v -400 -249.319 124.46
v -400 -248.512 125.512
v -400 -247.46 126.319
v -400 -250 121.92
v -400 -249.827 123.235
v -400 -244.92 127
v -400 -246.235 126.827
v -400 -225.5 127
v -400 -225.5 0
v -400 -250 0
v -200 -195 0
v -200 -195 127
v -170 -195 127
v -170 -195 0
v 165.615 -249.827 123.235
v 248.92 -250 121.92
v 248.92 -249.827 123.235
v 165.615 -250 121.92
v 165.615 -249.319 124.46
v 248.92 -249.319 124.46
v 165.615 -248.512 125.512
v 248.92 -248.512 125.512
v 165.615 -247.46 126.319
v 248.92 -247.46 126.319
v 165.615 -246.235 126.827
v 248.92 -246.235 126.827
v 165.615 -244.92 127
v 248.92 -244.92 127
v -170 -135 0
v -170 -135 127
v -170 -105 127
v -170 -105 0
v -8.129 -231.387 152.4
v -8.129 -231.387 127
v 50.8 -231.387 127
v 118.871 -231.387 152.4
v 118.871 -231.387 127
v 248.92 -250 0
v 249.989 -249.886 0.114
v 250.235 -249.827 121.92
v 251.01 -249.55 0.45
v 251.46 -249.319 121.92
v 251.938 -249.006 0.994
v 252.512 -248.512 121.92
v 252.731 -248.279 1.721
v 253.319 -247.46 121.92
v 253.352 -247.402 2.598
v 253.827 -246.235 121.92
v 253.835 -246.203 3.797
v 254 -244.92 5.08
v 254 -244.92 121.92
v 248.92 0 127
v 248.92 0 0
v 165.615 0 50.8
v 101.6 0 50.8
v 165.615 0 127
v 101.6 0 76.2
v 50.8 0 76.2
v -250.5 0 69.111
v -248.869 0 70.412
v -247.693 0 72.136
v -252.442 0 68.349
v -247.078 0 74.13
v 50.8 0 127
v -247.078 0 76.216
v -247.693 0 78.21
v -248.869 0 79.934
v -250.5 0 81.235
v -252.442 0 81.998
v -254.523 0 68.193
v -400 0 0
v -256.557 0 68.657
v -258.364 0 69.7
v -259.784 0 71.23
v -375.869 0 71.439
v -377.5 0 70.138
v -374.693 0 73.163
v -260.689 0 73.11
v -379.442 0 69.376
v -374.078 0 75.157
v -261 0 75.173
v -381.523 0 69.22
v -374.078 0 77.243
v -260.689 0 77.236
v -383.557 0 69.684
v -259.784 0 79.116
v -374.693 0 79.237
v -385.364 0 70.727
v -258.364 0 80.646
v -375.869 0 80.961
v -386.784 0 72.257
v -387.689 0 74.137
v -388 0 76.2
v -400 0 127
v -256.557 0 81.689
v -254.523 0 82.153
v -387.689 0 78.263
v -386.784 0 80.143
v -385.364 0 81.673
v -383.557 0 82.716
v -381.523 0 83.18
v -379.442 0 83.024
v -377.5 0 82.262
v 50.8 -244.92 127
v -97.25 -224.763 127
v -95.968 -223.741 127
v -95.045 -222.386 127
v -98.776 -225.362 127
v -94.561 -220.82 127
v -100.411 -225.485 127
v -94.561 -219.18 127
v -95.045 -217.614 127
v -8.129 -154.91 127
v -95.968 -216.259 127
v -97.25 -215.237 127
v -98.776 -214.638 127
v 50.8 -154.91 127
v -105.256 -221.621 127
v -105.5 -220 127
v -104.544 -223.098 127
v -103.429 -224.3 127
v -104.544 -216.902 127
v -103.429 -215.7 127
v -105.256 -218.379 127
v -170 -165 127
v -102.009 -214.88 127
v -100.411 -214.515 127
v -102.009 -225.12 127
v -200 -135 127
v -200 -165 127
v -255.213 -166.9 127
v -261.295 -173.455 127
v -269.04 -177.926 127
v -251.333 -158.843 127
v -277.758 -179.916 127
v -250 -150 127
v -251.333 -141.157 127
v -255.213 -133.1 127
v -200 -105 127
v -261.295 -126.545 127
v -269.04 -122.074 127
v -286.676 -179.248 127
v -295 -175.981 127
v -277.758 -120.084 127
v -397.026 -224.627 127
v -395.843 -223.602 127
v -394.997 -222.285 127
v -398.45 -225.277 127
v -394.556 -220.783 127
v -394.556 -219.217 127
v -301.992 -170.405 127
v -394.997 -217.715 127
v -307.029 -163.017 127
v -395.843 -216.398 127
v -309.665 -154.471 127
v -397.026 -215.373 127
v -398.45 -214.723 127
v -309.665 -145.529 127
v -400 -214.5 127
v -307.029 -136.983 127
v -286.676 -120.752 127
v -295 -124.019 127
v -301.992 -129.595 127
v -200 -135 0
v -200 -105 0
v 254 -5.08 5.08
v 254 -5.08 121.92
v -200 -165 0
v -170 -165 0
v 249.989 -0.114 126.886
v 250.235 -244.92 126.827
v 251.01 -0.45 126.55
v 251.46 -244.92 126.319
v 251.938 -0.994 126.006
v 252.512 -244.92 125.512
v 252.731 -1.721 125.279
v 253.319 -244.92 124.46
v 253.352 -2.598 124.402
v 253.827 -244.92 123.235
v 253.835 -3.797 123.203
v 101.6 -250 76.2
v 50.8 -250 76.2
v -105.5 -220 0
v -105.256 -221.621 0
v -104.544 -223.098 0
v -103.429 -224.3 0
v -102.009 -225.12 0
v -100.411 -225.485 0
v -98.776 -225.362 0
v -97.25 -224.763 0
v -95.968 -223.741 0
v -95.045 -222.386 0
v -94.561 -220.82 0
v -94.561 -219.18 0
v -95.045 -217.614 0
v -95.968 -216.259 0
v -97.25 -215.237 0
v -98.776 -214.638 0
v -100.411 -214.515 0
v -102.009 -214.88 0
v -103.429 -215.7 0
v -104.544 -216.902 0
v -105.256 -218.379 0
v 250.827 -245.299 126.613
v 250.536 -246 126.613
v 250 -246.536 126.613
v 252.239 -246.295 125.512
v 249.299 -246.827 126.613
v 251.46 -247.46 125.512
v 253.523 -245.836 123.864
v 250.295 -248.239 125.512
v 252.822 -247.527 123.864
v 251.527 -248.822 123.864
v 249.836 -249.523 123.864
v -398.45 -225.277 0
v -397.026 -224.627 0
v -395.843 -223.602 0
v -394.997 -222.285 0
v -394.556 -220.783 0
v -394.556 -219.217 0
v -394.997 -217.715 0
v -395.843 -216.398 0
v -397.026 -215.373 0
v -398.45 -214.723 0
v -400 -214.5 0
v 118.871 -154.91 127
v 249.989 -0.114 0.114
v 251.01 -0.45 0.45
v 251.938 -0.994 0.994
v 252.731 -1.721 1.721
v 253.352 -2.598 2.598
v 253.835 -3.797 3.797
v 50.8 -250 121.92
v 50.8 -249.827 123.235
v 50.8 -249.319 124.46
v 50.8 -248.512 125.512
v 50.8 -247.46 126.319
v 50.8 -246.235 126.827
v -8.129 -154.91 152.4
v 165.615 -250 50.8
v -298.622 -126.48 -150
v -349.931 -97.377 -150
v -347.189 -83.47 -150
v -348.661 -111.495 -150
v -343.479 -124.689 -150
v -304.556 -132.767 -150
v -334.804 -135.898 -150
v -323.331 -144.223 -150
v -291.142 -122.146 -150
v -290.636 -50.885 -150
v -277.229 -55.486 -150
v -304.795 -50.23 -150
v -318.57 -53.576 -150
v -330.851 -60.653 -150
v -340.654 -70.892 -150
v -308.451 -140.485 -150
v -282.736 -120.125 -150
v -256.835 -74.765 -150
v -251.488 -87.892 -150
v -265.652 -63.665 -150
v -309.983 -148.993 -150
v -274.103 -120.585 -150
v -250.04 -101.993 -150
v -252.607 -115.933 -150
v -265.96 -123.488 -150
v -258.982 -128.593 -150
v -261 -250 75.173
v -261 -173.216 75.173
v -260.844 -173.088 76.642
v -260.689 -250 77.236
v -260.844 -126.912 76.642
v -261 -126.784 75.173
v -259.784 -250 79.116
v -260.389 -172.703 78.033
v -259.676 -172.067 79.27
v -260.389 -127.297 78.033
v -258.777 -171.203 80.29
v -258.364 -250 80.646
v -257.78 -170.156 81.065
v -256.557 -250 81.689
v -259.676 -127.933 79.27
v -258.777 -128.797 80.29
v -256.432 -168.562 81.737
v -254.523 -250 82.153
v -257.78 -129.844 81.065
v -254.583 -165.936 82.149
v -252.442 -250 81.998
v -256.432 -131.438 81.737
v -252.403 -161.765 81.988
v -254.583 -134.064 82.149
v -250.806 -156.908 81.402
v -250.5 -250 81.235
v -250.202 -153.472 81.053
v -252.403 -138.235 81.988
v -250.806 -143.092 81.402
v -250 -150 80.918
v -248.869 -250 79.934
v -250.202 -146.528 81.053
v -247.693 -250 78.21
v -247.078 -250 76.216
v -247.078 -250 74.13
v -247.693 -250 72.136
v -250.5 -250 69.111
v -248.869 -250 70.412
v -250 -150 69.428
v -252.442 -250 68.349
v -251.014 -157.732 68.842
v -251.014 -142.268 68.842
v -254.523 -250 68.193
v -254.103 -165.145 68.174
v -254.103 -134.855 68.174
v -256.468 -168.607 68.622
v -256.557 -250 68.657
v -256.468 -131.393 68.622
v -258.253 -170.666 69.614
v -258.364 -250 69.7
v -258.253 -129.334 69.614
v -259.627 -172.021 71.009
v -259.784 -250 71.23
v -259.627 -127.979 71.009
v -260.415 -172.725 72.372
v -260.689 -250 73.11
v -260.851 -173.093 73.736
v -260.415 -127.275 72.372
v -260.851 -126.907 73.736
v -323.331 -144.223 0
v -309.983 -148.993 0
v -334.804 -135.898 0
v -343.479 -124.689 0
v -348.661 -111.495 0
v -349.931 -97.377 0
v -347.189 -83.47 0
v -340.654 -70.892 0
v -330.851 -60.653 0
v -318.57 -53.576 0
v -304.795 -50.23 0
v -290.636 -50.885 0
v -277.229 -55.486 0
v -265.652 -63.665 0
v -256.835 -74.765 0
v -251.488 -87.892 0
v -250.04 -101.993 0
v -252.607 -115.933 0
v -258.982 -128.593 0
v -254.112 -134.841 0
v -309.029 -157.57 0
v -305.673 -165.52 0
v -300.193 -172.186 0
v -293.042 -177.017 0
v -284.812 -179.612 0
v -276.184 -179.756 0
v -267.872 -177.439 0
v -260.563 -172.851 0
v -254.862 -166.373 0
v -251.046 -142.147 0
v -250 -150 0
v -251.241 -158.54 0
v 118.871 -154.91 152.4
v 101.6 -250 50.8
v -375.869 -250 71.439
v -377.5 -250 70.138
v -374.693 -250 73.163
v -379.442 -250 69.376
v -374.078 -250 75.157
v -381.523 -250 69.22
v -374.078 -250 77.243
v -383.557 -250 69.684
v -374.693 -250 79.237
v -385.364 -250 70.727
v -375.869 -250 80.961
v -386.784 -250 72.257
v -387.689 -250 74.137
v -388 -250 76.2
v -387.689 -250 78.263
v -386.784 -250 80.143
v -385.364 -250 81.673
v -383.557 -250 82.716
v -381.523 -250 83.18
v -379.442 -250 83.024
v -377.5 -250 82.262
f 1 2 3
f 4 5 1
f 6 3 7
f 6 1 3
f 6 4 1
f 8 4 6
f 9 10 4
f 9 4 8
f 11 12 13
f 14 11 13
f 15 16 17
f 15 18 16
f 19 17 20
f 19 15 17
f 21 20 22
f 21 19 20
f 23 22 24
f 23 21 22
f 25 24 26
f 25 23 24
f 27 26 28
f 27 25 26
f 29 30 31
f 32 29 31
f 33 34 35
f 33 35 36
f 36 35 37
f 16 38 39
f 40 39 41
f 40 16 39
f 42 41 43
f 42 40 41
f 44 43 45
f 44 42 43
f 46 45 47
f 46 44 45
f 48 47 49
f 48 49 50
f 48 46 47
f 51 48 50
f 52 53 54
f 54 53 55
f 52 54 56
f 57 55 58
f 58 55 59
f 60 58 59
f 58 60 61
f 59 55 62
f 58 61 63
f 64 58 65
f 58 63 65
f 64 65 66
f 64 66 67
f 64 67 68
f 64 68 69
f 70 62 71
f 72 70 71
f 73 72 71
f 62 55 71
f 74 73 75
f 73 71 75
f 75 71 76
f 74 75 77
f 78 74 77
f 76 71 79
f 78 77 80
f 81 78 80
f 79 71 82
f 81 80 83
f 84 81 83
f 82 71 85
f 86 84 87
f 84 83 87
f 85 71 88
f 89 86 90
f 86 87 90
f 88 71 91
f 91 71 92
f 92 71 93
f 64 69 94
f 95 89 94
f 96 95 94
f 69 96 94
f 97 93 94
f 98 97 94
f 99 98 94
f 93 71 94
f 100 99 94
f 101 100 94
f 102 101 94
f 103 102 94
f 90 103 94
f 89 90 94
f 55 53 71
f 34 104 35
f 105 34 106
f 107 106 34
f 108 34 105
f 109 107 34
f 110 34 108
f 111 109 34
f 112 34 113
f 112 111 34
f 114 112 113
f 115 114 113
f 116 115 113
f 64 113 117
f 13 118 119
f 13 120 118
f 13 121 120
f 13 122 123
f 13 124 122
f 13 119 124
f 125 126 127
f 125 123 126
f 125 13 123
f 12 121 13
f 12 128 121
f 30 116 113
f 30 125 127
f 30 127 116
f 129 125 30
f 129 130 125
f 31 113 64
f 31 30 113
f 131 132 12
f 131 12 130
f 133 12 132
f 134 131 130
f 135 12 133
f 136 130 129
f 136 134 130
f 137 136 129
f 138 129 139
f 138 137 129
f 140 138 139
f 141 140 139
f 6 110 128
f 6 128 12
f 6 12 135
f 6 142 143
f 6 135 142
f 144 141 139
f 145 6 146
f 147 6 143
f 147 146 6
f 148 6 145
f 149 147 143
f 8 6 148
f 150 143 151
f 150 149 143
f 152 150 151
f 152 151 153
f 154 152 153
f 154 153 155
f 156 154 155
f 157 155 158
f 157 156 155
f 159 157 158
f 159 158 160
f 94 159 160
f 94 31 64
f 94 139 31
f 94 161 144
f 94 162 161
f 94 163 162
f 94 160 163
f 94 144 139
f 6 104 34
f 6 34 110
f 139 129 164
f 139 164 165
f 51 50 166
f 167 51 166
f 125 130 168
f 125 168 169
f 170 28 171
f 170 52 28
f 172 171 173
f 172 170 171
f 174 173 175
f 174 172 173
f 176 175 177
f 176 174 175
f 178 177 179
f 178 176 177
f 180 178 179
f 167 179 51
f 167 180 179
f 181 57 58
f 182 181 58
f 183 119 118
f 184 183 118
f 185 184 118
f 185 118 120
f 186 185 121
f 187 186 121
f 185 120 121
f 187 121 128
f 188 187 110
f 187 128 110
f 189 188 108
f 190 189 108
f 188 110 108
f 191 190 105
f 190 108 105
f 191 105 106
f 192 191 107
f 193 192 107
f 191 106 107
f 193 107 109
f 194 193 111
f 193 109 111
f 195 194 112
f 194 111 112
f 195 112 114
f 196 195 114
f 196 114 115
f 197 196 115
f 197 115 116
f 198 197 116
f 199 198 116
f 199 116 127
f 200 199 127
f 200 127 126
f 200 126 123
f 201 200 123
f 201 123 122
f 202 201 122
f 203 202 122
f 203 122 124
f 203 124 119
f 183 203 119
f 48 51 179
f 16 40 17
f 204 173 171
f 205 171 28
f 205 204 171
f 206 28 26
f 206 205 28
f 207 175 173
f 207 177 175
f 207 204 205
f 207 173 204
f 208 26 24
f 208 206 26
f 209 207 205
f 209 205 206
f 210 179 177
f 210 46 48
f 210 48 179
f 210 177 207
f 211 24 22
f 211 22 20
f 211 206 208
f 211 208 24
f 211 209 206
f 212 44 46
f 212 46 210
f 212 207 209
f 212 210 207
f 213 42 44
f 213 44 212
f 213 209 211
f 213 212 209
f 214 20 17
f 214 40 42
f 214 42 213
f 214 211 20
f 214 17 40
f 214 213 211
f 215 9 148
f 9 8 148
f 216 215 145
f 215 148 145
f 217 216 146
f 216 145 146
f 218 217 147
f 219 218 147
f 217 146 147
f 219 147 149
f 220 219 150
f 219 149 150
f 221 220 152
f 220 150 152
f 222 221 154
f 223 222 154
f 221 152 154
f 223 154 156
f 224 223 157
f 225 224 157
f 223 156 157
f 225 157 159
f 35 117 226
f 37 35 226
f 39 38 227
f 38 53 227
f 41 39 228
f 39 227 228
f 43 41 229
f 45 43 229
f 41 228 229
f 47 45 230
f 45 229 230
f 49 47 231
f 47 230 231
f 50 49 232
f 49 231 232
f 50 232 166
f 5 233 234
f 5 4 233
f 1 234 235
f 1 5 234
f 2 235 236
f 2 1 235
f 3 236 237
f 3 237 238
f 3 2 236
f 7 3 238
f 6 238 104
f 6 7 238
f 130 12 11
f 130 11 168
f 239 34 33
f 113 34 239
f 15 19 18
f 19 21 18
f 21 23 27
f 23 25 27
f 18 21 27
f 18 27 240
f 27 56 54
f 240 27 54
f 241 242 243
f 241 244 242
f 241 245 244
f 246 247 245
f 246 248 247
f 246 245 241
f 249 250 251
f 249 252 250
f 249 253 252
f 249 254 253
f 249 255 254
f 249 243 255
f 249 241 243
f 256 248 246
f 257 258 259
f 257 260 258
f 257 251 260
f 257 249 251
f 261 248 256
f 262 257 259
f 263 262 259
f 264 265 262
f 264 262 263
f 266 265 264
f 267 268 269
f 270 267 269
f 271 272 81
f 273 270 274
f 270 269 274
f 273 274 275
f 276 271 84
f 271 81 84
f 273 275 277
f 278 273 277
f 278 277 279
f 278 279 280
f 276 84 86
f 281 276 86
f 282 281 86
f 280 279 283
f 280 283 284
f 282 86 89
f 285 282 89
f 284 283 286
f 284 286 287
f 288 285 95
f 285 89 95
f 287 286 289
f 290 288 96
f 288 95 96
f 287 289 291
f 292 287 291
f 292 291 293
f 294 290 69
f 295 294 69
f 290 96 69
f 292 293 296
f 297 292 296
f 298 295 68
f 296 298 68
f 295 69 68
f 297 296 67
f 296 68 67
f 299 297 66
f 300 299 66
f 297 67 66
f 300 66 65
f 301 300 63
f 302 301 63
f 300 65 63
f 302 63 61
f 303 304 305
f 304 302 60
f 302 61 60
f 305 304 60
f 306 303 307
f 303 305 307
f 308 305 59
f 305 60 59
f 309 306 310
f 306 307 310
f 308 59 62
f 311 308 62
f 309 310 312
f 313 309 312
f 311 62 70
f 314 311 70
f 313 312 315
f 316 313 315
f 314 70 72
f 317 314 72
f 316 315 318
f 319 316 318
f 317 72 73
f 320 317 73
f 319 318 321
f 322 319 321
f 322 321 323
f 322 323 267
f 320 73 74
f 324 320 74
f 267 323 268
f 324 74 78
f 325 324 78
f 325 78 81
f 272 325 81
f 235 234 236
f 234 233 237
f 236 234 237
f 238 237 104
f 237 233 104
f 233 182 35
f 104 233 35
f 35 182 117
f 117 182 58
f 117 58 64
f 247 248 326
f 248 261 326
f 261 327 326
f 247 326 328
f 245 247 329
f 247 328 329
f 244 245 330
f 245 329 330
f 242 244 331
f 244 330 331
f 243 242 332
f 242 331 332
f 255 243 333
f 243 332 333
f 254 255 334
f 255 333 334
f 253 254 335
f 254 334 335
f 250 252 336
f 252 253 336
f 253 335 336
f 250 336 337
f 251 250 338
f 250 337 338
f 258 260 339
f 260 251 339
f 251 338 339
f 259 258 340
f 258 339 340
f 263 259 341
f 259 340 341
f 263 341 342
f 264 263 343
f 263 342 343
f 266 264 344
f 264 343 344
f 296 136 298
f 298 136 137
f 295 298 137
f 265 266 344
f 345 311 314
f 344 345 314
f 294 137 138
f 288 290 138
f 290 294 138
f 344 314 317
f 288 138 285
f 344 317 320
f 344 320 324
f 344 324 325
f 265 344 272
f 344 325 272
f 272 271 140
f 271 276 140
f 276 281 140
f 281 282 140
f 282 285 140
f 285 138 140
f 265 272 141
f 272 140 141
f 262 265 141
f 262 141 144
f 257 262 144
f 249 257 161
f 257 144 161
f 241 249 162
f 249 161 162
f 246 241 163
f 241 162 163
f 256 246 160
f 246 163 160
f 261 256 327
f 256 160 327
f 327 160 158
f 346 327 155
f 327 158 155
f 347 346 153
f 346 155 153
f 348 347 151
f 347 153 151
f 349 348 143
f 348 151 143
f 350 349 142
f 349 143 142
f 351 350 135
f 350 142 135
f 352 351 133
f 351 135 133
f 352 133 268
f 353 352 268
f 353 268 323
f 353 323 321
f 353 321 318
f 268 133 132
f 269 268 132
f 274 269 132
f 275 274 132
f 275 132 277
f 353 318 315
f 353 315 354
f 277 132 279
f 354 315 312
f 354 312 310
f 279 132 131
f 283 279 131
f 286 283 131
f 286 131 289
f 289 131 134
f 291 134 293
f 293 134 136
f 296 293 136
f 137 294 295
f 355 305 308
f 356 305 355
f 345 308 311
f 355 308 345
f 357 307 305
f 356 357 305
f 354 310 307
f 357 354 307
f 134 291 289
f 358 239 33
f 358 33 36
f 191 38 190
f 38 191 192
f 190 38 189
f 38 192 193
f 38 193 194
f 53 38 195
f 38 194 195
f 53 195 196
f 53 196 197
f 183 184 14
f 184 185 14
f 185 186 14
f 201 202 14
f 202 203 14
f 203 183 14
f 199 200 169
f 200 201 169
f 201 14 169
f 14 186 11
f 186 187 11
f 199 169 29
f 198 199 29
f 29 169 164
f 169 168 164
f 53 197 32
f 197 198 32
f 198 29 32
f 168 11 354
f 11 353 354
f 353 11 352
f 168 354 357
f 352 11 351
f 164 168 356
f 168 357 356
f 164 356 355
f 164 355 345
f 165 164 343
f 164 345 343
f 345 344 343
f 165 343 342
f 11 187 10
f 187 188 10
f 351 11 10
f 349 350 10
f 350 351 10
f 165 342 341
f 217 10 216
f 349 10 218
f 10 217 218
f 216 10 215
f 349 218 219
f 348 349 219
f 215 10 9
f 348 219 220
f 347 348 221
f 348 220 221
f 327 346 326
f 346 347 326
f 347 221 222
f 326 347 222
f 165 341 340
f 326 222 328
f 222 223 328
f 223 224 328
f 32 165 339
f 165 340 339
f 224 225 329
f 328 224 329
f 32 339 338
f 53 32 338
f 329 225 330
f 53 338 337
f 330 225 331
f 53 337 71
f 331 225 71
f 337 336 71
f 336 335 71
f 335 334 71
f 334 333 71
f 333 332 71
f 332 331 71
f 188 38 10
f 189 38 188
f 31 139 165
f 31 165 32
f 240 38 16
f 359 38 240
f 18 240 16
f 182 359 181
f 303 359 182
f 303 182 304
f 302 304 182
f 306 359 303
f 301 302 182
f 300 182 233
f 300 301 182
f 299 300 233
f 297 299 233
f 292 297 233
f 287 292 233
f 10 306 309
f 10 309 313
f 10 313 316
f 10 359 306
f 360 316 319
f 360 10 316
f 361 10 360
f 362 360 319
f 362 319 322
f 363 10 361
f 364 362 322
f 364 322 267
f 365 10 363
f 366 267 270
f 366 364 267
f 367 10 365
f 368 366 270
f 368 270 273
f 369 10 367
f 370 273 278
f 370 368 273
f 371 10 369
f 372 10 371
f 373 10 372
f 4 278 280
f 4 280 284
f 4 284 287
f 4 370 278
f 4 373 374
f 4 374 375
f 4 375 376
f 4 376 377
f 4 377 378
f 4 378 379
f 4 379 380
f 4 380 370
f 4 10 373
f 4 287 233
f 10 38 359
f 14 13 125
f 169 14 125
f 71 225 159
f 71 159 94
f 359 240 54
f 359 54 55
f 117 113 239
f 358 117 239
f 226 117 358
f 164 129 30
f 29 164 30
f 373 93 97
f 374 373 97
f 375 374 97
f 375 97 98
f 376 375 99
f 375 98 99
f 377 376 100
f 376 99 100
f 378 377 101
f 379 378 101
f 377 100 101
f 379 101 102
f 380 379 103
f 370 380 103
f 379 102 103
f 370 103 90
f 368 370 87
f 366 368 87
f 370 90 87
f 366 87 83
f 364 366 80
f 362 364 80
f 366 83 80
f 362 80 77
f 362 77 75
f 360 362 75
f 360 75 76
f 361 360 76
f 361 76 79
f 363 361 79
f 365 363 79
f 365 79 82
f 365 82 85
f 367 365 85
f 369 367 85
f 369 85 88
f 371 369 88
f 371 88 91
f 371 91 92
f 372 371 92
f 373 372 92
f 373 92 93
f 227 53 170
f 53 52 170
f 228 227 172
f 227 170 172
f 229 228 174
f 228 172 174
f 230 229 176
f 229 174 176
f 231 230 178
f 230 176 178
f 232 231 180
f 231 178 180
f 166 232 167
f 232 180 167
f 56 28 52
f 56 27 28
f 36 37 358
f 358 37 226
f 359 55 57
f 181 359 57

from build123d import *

# Parameters (mm, degrees)
F0_W      = 400
F0_H      = 250
F1_DEPTH  = 127
F2_R      = 50
F3_DEPTH  = 150
F5_D      = 11
F7_D      = 14
F8_DEPTH  = 254
F9_R      = 5.08
F11_DEPTH = 250.001
F12_W     = 127
F12_H     = 76.4771783382
F13_DEPTH = 25.4
F14_W     = 30
F14_H     = 30
F14_R     = 30
F15_DEPTH = 277.001


with BuildPart() as f1:
    # F0 (on Top) → F1 (new body)
    with BuildSketch(Plane.XY):
        with Locations((-200, -125)):
            Rectangle(F0_W, F0_H)
    extrude(amount=F1_DEPTH)

    # F2 (on face) → F3 (join)
    with BuildSketch(Plane(origin=(0, 0, 0), x_dir=(1, 0, 0), z_dir=(0, 0, -1))):
        with Locations((-300, 100)):
            Circle(F2_R)
    extrude(amount=F3_DEPTH)

    # F5 (through all)
    with Locations(Plane(origin=(0, 0, 0), x_dir=(1, 0, 0), z_dir=(0, 0, -1))):
        with Locations((-400, 220), (-100, 220)):
            Hole(F5_D / 2)

    # F7 (through all)
    with Locations(Plane.XZ.offset(250)):
        with Locations((-381, 76.2), (-254, 75.1730280948)):
            Hole(F7_D / 2)

    # F8 (add): a face of the model
    f8_faces = [f1.faces().sort_by_distance(p)[0] for p in [
        (0, -125, 63.5),
    ]]
    extrude(f8_faces, amount=F8_DEPTH)

    # F9
    f9_edges = [f1.edges().sort_by_distance(p)[0] for p in [
        (254, -250, 63.5),
        (254, 0, 63.5),
        (254, -125, 0),
        (254, -125, 127),
        (-73, -250, 127),
    ]]
    fillet(f9_edges, radius=F9_R)

    # F10 (on face) → F11 (cut, through all)
    with BuildSketch(Plane(origin=(0, 0, 0), x_dir=(-1, 0, 0), z_dir=(0, 1, 0))):
        Polygon((-50.8, 127), (-165.6154772818, 127), (-165.6154772818, 50.8), (-101.6, 50.8), (-101.6, 76.2), (-50.8, 76.2), align=None)
    extrude(amount=-F11_DEPTH, mode=Mode.SUBTRACT)

    # F12 (on face) → F13 (join)
    with BuildSketch(Plane.XY.offset(127)):
        with Locations((55.3710968234, -193.1489035487)):
            Rectangle(F12_W, F12_H)
    extrude(amount=F13_DEPTH)

    # F14 (on face) → F15 (cut, through all)
    with BuildSketch(Plane.XY.offset(127)):
        with Locations((-185, -120)):
            Rectangle(F14_W, F14_H)
        with Locations((-185, -180)):
            Rectangle(F14_W, F14_H)
        with Locations((-280, -150)):
            Circle(F14_R)
    extrude(amount=-F15_DEPTH, mode=Mode.SUBTRACT)


solid = f1.part
